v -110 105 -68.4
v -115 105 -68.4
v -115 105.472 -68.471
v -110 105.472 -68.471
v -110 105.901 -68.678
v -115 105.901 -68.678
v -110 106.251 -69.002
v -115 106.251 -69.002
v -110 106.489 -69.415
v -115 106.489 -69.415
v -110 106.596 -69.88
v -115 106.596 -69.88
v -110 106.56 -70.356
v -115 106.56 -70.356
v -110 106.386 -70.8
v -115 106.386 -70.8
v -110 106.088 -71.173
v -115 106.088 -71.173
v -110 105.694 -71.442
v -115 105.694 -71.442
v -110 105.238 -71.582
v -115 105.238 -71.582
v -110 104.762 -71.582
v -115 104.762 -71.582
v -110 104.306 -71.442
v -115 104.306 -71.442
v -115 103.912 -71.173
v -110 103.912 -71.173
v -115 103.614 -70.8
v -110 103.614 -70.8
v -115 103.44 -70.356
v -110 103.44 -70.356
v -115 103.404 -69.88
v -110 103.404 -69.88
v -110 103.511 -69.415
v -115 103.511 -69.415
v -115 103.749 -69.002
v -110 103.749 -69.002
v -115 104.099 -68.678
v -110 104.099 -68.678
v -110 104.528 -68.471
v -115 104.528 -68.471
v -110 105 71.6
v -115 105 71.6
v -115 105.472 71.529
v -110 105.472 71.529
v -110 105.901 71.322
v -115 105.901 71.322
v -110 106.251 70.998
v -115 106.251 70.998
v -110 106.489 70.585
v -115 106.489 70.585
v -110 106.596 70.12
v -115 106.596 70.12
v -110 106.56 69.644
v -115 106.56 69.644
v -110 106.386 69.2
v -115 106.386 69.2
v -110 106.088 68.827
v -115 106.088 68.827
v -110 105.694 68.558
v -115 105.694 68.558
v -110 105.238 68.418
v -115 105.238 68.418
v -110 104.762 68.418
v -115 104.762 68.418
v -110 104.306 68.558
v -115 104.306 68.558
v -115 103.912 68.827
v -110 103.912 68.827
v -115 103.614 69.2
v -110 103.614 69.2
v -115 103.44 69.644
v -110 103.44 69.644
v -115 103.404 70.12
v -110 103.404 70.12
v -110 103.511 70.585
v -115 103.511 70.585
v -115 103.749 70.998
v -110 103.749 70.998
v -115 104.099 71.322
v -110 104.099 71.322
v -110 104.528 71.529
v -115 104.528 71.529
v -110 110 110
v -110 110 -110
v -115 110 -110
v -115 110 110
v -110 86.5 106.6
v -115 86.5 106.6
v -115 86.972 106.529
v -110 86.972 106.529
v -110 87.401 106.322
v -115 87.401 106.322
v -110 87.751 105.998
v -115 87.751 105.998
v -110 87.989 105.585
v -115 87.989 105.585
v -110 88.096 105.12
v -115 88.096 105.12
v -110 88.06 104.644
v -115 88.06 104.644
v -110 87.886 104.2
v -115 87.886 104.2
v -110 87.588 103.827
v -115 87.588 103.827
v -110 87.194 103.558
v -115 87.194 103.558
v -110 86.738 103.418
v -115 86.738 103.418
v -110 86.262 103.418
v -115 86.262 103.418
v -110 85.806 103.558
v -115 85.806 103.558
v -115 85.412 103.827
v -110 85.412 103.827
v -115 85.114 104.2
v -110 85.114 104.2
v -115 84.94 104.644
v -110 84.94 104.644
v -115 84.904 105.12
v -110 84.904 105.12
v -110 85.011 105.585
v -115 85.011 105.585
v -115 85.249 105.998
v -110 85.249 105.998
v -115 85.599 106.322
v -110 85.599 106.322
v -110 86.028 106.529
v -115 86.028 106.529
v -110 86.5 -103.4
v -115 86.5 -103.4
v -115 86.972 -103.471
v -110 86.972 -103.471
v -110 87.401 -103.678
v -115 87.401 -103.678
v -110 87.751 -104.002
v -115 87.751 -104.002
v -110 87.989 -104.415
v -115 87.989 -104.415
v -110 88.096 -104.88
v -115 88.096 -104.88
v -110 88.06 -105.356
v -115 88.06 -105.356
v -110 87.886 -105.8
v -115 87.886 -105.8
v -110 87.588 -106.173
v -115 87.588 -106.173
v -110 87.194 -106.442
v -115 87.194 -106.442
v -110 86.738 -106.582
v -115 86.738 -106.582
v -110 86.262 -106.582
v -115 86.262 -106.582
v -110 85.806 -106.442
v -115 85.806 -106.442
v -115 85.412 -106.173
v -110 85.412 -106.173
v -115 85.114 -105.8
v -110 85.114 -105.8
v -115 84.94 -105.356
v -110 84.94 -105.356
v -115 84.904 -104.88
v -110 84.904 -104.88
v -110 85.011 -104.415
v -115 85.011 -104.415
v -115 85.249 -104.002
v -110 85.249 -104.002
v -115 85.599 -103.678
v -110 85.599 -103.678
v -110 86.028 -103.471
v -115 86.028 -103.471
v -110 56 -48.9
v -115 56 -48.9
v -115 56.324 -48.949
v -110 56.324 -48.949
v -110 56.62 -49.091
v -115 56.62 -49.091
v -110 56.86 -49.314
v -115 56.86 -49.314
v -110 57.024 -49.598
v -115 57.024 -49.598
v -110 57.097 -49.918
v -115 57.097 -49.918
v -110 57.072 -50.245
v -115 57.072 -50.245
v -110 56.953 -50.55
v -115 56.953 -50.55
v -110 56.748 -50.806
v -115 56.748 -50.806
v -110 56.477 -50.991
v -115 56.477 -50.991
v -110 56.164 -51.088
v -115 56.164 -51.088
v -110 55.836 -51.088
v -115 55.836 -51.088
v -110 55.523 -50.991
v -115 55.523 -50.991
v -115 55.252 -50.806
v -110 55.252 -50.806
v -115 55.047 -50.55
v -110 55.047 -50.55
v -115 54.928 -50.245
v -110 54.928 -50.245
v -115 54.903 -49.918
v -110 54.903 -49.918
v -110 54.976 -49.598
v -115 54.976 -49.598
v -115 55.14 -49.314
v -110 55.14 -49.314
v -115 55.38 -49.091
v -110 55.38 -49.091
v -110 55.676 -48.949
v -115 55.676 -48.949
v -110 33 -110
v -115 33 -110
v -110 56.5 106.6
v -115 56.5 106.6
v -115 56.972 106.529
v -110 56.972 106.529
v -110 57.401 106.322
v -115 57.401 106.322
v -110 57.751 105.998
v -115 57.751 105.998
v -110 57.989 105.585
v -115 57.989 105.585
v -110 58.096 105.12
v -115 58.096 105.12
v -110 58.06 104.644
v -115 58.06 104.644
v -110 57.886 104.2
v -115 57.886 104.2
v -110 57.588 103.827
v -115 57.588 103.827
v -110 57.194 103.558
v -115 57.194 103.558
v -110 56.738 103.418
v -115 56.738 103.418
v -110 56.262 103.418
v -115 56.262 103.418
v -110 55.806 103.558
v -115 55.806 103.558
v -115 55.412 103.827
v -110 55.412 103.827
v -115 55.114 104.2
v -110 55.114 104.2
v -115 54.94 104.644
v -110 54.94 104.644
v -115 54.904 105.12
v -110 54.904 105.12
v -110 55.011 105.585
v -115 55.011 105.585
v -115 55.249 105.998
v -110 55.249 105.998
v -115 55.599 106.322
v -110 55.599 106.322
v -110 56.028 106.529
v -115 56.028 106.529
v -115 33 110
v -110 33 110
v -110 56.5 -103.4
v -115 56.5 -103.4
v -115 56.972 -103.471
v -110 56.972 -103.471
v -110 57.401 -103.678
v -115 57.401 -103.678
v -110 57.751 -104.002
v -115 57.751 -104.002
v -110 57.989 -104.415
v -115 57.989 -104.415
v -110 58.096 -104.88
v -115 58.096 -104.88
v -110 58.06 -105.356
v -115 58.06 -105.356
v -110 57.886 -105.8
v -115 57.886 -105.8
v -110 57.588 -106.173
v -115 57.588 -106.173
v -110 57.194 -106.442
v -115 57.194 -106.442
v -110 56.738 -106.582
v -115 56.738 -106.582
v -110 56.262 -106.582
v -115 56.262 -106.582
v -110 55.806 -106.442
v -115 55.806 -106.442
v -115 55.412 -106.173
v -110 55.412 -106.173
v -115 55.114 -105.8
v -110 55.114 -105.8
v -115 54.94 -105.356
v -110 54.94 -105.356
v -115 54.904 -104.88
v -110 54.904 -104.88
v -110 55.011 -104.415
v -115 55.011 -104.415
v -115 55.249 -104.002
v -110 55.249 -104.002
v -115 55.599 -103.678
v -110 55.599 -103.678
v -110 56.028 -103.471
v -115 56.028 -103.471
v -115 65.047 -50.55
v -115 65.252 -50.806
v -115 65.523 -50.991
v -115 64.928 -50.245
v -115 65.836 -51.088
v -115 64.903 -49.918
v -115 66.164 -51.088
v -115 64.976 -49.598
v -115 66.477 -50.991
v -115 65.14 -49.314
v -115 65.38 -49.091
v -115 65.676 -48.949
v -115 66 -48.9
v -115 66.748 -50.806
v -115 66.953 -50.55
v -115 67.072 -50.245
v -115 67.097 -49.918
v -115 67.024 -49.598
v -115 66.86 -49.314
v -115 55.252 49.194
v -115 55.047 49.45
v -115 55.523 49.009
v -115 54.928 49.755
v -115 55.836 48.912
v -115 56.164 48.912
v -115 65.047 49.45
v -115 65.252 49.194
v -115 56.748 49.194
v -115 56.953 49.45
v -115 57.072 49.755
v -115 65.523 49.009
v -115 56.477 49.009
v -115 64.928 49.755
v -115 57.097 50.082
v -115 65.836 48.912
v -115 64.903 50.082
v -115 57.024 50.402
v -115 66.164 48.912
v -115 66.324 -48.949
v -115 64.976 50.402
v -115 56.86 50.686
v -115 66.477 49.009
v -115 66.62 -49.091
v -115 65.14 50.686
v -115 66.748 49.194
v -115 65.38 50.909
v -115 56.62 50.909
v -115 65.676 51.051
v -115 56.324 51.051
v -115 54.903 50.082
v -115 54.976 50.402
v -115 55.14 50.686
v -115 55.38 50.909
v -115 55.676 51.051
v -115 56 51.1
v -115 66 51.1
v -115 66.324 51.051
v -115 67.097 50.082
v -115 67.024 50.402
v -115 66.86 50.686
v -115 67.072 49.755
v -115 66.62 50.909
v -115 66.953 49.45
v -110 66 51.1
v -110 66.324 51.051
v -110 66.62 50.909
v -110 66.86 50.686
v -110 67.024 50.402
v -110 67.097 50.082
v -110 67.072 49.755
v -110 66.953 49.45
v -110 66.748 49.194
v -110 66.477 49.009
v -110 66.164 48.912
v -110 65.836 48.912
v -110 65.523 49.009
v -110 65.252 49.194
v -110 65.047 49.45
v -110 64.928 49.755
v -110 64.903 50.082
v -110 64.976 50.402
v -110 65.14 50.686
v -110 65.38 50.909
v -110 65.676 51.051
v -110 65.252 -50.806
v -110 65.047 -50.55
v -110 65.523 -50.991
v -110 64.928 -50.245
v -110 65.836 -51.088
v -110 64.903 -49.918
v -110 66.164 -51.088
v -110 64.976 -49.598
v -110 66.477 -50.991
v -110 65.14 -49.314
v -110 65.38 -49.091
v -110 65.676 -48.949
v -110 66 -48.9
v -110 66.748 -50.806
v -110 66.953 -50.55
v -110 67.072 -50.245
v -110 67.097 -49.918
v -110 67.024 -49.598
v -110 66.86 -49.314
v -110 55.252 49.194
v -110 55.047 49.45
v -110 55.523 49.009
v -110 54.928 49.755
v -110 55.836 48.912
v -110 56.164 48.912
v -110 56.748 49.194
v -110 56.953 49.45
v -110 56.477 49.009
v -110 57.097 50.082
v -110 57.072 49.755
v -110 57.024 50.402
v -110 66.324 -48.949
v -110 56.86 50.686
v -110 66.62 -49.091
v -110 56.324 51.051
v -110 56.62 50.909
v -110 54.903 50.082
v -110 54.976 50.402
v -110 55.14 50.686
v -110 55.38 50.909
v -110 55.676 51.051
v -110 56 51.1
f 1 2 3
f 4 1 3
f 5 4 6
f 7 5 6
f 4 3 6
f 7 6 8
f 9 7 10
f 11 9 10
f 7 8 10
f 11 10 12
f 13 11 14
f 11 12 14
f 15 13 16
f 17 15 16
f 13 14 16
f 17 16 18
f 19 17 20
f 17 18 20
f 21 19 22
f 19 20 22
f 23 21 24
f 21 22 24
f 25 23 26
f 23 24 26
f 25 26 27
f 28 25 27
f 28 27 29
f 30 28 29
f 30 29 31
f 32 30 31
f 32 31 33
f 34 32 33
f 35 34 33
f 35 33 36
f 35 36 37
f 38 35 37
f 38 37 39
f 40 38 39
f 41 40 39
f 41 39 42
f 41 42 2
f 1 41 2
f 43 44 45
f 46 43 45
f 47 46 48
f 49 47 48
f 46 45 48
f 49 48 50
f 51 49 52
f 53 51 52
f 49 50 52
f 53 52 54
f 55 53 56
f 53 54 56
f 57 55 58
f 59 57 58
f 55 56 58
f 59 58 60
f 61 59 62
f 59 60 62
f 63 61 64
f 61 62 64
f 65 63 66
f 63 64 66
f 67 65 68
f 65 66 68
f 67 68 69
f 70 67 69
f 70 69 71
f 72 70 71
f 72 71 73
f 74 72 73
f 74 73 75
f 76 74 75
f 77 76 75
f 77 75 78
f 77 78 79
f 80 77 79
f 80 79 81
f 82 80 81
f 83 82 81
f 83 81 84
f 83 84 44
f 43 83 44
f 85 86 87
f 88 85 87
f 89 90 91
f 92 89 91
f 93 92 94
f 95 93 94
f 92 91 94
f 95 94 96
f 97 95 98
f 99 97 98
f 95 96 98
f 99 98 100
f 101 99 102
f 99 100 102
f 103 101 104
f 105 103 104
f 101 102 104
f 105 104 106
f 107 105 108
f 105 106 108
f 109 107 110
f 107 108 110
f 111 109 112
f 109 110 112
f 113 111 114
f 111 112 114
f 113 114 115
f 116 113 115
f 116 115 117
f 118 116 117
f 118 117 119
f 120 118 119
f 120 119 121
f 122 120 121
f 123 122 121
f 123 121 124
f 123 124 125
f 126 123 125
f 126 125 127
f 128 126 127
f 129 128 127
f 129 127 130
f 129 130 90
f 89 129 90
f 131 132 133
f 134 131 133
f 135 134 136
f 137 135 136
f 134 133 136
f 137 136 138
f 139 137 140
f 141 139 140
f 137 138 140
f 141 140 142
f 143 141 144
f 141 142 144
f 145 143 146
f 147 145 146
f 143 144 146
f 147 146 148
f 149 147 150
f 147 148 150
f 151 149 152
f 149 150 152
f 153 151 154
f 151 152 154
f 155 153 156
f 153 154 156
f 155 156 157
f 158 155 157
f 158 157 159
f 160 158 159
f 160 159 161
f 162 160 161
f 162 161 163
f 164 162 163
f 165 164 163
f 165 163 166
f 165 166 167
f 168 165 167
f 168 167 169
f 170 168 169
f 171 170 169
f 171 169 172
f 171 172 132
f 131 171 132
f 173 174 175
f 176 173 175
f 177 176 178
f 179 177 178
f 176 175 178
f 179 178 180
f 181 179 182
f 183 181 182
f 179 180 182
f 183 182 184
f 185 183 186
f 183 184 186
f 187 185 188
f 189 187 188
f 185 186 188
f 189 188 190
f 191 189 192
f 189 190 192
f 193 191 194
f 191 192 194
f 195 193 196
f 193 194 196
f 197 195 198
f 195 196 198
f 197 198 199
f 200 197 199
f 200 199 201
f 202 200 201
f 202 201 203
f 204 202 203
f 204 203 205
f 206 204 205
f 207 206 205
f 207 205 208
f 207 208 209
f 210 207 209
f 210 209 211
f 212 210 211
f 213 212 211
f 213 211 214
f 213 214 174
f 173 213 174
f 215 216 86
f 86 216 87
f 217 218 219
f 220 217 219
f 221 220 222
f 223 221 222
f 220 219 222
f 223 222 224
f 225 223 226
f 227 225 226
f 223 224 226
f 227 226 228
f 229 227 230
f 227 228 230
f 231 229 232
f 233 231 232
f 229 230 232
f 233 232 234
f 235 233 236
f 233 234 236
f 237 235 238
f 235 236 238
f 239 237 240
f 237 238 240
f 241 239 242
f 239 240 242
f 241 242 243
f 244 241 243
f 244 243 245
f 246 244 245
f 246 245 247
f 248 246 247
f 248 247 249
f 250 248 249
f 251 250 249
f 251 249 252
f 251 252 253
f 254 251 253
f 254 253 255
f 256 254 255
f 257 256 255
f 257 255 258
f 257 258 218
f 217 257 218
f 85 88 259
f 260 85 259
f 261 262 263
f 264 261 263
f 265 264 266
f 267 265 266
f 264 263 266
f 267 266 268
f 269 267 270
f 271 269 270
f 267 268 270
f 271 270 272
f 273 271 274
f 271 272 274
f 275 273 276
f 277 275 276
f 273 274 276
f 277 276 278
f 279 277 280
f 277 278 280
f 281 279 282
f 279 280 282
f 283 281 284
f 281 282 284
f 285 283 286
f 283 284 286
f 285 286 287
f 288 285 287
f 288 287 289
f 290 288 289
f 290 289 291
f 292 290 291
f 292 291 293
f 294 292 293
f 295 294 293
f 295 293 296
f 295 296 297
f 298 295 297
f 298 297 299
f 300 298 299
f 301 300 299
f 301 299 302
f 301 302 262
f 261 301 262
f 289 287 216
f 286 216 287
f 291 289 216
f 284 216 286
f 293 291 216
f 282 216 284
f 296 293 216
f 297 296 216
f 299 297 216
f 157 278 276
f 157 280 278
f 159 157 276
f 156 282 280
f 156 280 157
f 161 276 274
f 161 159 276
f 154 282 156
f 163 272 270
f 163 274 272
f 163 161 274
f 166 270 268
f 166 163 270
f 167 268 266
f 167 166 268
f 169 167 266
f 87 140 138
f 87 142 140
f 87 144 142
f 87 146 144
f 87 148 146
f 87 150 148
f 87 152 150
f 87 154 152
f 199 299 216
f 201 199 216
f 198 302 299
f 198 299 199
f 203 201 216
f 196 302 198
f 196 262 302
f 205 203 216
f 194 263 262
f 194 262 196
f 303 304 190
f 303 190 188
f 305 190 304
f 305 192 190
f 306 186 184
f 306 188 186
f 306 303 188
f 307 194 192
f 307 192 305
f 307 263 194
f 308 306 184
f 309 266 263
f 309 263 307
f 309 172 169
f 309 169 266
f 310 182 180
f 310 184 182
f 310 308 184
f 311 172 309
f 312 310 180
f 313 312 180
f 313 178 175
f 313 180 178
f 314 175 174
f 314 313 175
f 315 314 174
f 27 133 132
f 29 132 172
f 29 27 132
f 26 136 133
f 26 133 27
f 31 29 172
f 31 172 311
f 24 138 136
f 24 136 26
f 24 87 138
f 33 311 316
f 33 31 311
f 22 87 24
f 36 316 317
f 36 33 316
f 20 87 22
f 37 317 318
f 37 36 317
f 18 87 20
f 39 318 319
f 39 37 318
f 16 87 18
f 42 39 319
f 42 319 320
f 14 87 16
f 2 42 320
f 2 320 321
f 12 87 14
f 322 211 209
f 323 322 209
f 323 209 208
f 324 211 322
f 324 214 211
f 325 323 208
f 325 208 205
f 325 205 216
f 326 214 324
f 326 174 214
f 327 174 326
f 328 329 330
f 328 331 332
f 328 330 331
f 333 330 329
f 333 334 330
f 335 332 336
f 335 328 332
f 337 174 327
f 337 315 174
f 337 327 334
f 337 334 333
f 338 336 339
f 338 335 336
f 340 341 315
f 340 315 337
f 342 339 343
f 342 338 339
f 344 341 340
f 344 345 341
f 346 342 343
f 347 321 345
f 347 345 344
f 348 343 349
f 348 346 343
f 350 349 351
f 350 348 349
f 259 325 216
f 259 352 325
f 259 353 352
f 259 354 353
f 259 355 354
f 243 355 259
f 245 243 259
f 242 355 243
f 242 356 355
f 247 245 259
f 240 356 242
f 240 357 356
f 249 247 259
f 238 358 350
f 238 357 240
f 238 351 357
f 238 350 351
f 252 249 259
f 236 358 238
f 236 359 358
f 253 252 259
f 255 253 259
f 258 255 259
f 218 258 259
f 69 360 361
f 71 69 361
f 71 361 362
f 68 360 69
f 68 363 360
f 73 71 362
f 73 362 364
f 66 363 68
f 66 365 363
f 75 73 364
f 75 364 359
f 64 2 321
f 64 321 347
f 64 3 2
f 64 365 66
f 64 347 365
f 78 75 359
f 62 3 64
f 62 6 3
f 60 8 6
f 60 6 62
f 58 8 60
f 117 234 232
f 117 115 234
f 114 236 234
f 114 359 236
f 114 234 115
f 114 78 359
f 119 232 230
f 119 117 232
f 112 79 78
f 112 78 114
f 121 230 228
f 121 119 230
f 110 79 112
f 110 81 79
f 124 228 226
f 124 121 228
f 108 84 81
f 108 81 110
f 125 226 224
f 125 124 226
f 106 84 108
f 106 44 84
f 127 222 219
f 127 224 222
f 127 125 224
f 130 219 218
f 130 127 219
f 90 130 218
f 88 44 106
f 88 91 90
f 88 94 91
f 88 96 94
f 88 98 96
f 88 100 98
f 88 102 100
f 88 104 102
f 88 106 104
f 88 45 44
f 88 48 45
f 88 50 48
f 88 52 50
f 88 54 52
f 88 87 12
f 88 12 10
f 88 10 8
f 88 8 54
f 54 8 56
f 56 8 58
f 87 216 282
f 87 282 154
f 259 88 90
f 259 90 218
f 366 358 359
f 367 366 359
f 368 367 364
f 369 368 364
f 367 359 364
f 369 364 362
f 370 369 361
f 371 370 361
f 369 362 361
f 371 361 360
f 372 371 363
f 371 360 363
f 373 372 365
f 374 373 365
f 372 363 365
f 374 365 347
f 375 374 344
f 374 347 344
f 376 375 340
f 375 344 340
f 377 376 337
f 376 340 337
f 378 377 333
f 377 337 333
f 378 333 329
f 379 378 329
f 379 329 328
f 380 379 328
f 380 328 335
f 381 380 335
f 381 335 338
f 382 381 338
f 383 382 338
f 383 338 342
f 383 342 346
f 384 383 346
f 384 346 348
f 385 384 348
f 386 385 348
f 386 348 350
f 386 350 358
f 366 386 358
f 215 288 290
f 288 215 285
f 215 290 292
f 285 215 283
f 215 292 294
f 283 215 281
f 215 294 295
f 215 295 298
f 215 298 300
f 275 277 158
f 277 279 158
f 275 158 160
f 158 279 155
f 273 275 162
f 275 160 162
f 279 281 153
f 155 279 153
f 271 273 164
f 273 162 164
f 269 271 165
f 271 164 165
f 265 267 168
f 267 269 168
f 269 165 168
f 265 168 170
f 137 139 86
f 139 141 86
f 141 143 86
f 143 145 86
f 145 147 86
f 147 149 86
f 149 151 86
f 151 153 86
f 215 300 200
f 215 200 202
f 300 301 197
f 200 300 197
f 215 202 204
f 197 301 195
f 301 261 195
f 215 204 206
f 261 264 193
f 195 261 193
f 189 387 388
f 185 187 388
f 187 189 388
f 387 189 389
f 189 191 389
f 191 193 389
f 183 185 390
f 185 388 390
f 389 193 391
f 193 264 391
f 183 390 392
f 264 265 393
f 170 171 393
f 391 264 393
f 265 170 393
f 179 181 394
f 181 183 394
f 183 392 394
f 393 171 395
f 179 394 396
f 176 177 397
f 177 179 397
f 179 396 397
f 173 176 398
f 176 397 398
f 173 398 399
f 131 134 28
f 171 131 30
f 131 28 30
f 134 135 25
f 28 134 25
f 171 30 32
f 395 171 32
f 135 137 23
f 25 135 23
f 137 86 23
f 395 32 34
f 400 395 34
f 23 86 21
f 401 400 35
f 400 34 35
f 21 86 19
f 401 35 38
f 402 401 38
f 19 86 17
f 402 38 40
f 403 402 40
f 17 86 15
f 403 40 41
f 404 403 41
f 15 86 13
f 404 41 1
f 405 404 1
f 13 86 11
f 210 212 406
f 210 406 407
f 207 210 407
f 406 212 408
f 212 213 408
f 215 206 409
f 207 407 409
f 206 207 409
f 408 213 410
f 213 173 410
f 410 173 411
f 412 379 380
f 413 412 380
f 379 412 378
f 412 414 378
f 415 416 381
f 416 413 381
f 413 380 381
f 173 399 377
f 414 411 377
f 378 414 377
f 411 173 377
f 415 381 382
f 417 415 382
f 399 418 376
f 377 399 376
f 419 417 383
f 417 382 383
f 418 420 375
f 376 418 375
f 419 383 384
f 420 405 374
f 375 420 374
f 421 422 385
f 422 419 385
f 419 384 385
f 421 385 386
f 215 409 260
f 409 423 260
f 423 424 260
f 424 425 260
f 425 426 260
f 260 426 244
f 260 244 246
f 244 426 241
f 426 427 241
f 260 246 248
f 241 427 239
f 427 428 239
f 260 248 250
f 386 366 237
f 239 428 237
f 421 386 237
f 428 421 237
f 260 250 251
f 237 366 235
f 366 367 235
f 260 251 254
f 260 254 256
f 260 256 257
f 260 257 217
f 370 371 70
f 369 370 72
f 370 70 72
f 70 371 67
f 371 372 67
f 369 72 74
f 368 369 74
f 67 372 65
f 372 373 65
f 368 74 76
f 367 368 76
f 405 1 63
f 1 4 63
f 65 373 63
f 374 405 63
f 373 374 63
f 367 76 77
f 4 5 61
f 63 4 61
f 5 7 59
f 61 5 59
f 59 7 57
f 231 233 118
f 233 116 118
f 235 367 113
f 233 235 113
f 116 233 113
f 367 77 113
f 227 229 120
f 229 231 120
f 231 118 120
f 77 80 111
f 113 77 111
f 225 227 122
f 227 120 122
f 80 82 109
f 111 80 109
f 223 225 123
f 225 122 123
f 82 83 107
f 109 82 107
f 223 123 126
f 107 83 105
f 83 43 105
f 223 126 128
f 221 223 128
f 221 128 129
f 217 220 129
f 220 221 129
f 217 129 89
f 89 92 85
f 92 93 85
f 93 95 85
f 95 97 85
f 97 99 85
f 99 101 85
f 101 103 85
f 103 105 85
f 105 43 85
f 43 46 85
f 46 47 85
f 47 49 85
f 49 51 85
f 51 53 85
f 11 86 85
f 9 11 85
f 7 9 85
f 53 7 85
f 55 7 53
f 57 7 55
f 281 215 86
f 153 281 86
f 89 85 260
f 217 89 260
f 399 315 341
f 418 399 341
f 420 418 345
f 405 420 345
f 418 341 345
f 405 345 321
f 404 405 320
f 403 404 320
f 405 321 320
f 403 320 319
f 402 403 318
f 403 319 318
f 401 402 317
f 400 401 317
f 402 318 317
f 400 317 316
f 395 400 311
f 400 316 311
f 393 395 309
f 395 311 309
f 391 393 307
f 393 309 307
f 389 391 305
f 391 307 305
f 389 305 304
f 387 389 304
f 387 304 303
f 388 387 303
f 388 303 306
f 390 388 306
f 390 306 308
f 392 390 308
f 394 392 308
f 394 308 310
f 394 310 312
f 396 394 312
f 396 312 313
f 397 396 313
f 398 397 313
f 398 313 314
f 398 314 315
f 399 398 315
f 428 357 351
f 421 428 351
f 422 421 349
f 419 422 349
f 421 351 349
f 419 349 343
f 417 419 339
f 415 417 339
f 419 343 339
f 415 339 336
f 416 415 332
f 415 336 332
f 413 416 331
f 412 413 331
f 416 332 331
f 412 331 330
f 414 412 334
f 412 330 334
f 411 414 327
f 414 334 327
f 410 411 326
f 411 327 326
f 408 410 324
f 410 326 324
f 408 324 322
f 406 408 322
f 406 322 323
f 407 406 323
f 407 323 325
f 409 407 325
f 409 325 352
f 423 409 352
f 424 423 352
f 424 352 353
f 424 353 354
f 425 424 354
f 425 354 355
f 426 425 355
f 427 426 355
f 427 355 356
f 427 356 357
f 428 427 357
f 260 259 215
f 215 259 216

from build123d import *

# Parameters (mm, degrees)
SKETCH1_W                  = 5
SKETCH1_H                  = 110
BOSS_EXTRUDE1_DEPTH        = 120
BOSS_EXTRUDE1_DEPTH_BACK   = 110
BOSS_EXTRUDE1_2_DEPTH      = 120
BOSS_EXTRUDE1_2_DEPTH_BACK = 110
SKETCH2_W                  = 5
SKETCH2_H                  = 37
BOSS_EXTRUDE2_DEPTH        = 50
SKETCH3_W                  = 220
SKETCH3_H                  = 5
BOSS_EXTRUDE3_DEPTH        = 50
SKETCH4_W                  = 230
SKETCH4_H                  = 73
BOSS_EXTRUDE6_DEPTH        = 5
CUT_EXTRUDE3_DEPTH         = 231
SKETCH5_W                  = 348
SKETCH5_H                  = 227
SKETCH5_W_2                = 328
SKETCH5_H_2                = 207
BOSS_EXTRUDE7_DEPTH        = 5
BOSS_EXTRUDE8_DEPTH        = 59
FILLET5_R                  = 15
BOSS_EXTRUDE9_DEPTH        = 5
BOSS_EXTRUDE10_DEPTH       = 5
FILLET6_R                  = 3
SKETCH14_W                 = 102.087252512
SKETCH14_H                 = 394.36321675
CUT_EXTRUDE4_DEPTH         = 165.048773235
CUT_EXTRUDE7_DEPTH         = 6
SKETCH17_R                 = 1.1
HOLES_FOR_PART_4_DEPTH     = 6
SKETCH18_R                 = 1.6
CUT_EXTRUDE9_DEPTH         = 6


with BuildPart() as part:
    # Sketch1 → Boss-Extrude1 (new body, two sides)
    with BuildSketch(Plane(origin=(0, 0, 0), x_dir=(0, 0, -1), z_dir=(1, 0, 0))) as boss_extrude1_sk:
        with Locations((-112.5, 55)):
            Rectangle(SKETCH1_W, SKETCH1_H)
    extrude(amount=BOSS_EXTRUDE1_DEPTH)
    extrude(boss_extrude1_sk.sketch, amount=-BOSS_EXTRUDE1_DEPTH_BACK)



with BuildPart() as body_2:
    # Sketch1 → Boss-Extrude1 2 (new body, two sides)
    with BuildSketch(Plane(origin=(0, 0, 0), x_dir=(0, 0, -1), z_dir=(1, 0, 0))) as boss_extrude1_2_sk:
        with Locations((112.5, 55)):
            Rectangle(SKETCH1_W, SKETCH1_H)
    extrude(amount=BOSS_EXTRUDE1_2_DEPTH)
    extrude(boss_extrude1_2_sk.sketch, amount=-BOSS_EXTRUDE1_2_DEPTH_BACK)


with BuildPart() as part_1:
    add(part.part)

    add(body_2.part)  # Boss-Extrude2 merges body 2
    # Sketch2 → Boss-Extrude2 (add)
    with BuildSketch(Plane.ZY.offset(110)):
        with Locations((-112.5, 18.5)):
            Rectangle(SKETCH2_W, SKETCH2_H)
        with Locations((112.5, 18.5)):
            Rectangle(SKETCH2_W, SKETCH2_H)
    extrude(amount=BOSS_EXTRUDE2_DEPTH)

    # Sketch3 → Boss-Extrude3 (add)
    with BuildSketch(Plane.ZY.offset(160)):
        with Locations((0, 34.5)):
            Rectangle(SKETCH3_W, SKETCH3_H)
    extrude(amount=-BOSS_EXTRUDE3_DEPTH)

    # Sketch4 → Boss-Extrude6 (add)
    with BuildSketch(Plane.ZY.offset(110)):
        with Locations((0, 73.5)):
            Rectangle(SKETCH4_W, SKETCH4_H)
    extrude(amount=BOSS_EXTRUDE6_DEPTH)

    # Sketch9 → Cut-Extrude3 (cut, through all)
    with BuildSketch(Plane.XY.offset(115)):
        Polygon((120, 110), (116.464466094, 106.464466094), (120, 102.928932188), align=None)
    extrude(amount=-CUT_EXTRUDE3_DEPTH, mode=Mode.SUBTRACT)

    # Sketch10 → Boss-Extrude8 (add)
    with BuildSketch(Plane.XY.offset(115)):
        Polygon((120, 110), (111.464466094, 110), (111.464466094, 0), (120, 0), (120, 102.928932188), (116.464466094, 106.464466094), align=None)
    boss_extrude8 = extrude(amount=BOSS_EXTRUDE8_DEPTH)

    # Mirror3: Boss-Extrude8 across plane
    add(boss_extrude8.mirror(Plane.XY))

    # Fillet5
    fillet5_edges = [part_1.edges().sort_by_distance(p)[0] for p in [
        (111.464466094, 55, 115),
        (111.464466094, 55, -115),
    ]]
    fillet(fillet5_edges, radius=FILLET5_R)

    # Fillet6
    fillet6_edges = [part_1.edges().sort_by_distance(p)[0] for p in [
        (111.464466094, 55, 174),
        (111.464466094, 55, -174),
    ]]
    fillet(fillet6_edges, radius=FILLET6_R)


with BuildPart() as body_2_2:
    # Sketch5 → Boss-Extrude7 (new body)
    with BuildSketch(Plane(origin=(115, 115, 0), x_dir=(0, 0, 1), z_dir=(-0.707106781, -0.707106781, 0))):
        with Locations((0, -120.571067812)):
            Rectangle(SKETCH5_W, SKETCH5_H)
        with Locations((0, -120.571067812)):
            Rectangle(SKETCH5_W_2, SKETCH5_H_2, mode=Mode.SUBTRACT)
    extrude(amount=BOSS_EXTRUDE7_DEPTH)


with BuildPart() as body_3:
    # Sketch12 → Boss-Extrude9 (new body)
    with BuildSketch(Plane.XY.offset(174)):
        Polygon((120, 0), (222.928932188, 0), (120, 102.928932188), align=None)
    extrude(amount=-BOSS_EXTRUDE9_DEPTH)


with BuildPart() as body_4:
    # Sketch13 → Boss-Extrude10 (new body)
    with BuildSketch(Plane(origin=(0, 0, -174), x_dir=(-1, 0, 0), z_dir=(0, 0, -1))):
        Polygon((-120, 102.928932188), (-120, 0), (-222.928932188, 0), align=None)
    extrude(amount=-BOSS_EXTRUDE10_DEPTH)


with BuildPart() as cut_extrude4_tool:
    # Sketch14 → Cut-Extrude4 (new body, through all)
    with BuildSketch(Plane(origin=(0, 110, 0), x_dir=(1, 0, 0), z_dir=(0, 1, 0))):
        Polygon((-110, 193.761157723), (-110, -200.602059027), (365.223312192, -200.602059027), (365.223312192, -115), (365.223312192, 105), (365.223312192, 193.761157723), align=None)
        with Locations((-166.043626256, -3.420450652)):
            Rectangle(SKETCH14_W, SKETCH14_H)
    extrude(amount=-CUT_EXTRUDE4_DEPTH)


with BuildPart() as part_2:
    add(part_1.part)

    # Cut-Extrude4: cut by cut_extrude4_tool
    add(cut_extrude4_tool.part, mode=Mode.SUBTRACT)

    # Sketch16 → Cut-Extrude7 (cut, through all)
    with BuildSketch(Plane.ZY.offset(115)):
        Polygon((-115, 0), (115, 0), (115, 32), (115, 110), (110, 110), (110, 33), (-110, 33), (-110, 110), (-115, 110), (-115, 32), align=None)
    extrude(amount=-CUT_EXTRUDE7_DEPTH, mode=Mode.SUBTRACT)

    # Sketch17 → Holes for part 4 (cut, through all)
    with BuildSketch(Plane.ZY.offset(115)):
        with Locations((50, 66)):
            Circle(SKETCH17_R)
        with Locations((50, 56)):
            Circle(SKETCH17_R)
        with Locations((-50, 56)):
            Circle(SKETCH17_R)
        with Locations((-50, 66)):
            Circle(SKETCH17_R)
    extrude(amount=-HOLES_FOR_PART_4_DEPTH, mode=Mode.SUBTRACT)

    # Sketch18 → Cut-Extrude9 (cut, through all)
    with BuildSketch(Plane.ZY.offset(115)):
        with Locations((105, 56.5)):
            Circle(SKETCH18_R)
        with Locations((105, 86.5)):
            Circle(SKETCH18_R)
        with Locations((-105, 86.5)):
            Circle(SKETCH18_R)
        with Locations((-105, 56.5)):
            Circle(SKETCH18_R)
        with Locations((70, 105)):
            Circle(SKETCH18_R)
        with Locations((-70, 105)):
            Circle(SKETCH18_R)
    extrude(amount=-CUT_EXTRUDE9_DEPTH, mode=Mode.SUBTRACT)


with BuildPart() as body_2_2_1:
    add(body_2_2.part)

    # Cut-Extrude4: cut by cut_extrude4_tool
    add(cut_extrude4_tool.part, mode=Mode.SUBTRACT)


with BuildPart() as body_3_1:
    add(body_3.part)

    # Cut-Extrude4: cut by cut_extrude4_tool
    add(cut_extrude4_tool.part, mode=Mode.SUBTRACT)


with BuildPart() as body_4_1:
    add(body_4.part)

    # Cut-Extrude4: cut by cut_extrude4_tool
    add(cut_extrude4_tool.part, mode=Mode.SUBTRACT)


solid = part_2.part
